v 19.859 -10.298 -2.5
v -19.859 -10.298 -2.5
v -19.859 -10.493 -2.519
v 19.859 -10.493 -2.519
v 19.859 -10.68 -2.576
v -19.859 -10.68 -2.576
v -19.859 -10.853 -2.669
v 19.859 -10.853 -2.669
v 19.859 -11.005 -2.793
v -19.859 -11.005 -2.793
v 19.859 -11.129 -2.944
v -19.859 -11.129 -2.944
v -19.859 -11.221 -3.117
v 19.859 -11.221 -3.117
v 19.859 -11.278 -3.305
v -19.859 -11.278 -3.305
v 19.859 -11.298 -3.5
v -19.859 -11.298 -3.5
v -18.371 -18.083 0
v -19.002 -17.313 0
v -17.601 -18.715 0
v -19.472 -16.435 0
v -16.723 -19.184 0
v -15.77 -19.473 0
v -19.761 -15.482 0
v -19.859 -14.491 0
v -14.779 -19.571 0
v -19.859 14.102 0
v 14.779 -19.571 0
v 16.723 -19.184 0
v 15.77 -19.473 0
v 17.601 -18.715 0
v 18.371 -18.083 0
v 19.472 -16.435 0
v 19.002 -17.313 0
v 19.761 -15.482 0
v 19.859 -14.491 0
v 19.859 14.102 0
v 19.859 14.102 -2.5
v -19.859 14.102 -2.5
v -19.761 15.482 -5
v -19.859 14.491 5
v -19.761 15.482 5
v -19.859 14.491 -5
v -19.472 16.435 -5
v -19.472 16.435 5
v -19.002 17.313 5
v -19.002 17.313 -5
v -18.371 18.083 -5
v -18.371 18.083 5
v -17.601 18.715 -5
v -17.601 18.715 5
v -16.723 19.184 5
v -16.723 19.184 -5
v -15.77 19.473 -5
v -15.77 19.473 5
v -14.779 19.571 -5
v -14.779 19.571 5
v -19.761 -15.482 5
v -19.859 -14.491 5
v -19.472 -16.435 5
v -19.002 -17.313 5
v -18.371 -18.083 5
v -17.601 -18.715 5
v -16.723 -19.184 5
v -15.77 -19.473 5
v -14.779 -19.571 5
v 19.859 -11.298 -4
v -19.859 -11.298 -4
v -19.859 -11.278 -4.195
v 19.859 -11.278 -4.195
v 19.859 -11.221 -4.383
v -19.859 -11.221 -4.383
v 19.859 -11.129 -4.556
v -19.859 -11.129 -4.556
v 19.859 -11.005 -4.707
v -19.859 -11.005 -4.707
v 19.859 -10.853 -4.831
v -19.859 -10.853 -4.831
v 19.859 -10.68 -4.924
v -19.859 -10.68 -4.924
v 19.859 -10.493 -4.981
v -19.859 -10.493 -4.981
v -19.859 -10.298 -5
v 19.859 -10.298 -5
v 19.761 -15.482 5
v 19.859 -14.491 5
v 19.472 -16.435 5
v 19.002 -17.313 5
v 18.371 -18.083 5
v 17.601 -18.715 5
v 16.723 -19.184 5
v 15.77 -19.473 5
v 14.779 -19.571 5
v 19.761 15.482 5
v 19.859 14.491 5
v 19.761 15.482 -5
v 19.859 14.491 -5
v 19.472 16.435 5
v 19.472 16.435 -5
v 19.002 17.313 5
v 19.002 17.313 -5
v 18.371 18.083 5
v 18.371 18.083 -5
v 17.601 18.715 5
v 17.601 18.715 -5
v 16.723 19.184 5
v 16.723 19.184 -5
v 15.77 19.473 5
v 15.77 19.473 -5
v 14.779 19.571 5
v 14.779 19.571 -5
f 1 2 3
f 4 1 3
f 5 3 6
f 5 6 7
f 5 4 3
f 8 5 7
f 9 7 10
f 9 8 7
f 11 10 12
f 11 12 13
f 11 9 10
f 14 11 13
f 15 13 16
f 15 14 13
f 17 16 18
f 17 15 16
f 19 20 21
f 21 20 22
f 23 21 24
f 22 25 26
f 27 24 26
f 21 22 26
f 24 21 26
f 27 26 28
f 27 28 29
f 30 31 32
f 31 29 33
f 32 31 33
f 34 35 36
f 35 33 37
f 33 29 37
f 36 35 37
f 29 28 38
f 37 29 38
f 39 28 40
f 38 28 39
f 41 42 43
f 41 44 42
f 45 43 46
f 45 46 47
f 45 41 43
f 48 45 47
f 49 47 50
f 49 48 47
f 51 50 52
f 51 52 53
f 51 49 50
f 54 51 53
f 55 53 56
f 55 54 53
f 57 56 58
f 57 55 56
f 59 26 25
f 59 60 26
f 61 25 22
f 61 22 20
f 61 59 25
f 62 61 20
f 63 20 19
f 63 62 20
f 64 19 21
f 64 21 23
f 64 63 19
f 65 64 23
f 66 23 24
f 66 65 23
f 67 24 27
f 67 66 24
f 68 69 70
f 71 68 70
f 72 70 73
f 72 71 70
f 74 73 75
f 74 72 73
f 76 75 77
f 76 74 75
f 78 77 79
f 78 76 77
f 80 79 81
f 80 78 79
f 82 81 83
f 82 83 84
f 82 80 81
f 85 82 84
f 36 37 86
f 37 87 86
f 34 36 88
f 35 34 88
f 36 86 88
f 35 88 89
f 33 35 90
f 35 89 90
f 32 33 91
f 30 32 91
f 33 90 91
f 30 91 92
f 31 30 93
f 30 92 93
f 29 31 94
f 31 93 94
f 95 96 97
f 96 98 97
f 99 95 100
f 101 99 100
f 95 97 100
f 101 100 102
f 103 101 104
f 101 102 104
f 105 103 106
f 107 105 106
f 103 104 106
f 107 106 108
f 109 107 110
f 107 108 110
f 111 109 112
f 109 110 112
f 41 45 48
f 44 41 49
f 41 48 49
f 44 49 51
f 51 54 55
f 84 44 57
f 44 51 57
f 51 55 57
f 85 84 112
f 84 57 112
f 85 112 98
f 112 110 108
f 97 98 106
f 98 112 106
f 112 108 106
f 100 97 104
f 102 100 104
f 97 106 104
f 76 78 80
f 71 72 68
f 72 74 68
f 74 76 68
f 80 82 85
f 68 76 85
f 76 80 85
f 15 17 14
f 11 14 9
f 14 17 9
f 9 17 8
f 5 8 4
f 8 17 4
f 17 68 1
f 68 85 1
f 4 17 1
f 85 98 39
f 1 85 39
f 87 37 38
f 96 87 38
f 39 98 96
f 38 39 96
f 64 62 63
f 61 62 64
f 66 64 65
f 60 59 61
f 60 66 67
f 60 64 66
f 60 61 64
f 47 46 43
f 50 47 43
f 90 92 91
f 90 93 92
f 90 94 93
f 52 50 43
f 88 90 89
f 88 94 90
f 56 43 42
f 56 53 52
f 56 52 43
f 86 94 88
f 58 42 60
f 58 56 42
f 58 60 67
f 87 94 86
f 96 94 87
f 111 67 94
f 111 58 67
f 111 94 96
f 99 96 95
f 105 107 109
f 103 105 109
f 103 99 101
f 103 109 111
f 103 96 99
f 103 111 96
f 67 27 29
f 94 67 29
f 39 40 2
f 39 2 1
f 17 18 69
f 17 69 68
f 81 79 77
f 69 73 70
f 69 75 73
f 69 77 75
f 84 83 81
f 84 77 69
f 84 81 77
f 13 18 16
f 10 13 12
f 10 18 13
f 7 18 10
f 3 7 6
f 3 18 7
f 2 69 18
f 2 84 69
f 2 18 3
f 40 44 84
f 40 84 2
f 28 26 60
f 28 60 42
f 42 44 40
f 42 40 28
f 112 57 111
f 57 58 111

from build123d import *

# Parameters (mm, degrees)
F0_W     = 39.717194
F0_H     = 39.141584
F1_DEPTH = 5
F2_W     = 39.717194
F2_H     = 5.46831
F3_DEPTH = 5
F4_W     = 39.717194
F4_H     = 2.5
F5_DEPTH = 25.4
F6_R     = 5.08
F7_R     = 1


with BuildPart() as f1:
    # F0 (on Top) → F1 (new body)
    with BuildSketch(Plane.XY):
        Rectangle(F0_W, F0_H)
    extrude(amount=F1_DEPTH)

    # F2 (on face) → F3 (join)
    with BuildSketch(Plane(origin=(0, 0, 0), x_dir=(1, 0, 0), z_dir=(0, 0, -1))):
        with Locations((0, -16.836637)):
            Rectangle(F2_W, F2_H)
    extrude(amount=F3_DEPTH)

    # F4 (on face) → F5 (join)
    with BuildSketch(Plane.XZ.offset(-14.102482)):
        with Locations((0, -3.75)):
            Rectangle(F4_W, F4_H)
    extrude(amount=F5_DEPTH)

    # F6
    f6_edges = [f1.edges().sort_by_distance(p)[0] for p in [
        (19.858597, 19.570792, 0),
        (19.858597, -19.570792, 2.5),
        (-19.858597, 19.570792, 0),
        (-19.858597, -19.570792, 2.5),
    ]]
    fillet(f6_edges, radius=F6_R)

    # F7
    f7_edges = [f1.edges().sort_by_distance(p)[0] for p in [
        (0, -11.297518, -5),
        (0, -11.297518, -2.5),
    ]]
    fillet(f7_edges, radius=F7_R)


solid = f1.part
